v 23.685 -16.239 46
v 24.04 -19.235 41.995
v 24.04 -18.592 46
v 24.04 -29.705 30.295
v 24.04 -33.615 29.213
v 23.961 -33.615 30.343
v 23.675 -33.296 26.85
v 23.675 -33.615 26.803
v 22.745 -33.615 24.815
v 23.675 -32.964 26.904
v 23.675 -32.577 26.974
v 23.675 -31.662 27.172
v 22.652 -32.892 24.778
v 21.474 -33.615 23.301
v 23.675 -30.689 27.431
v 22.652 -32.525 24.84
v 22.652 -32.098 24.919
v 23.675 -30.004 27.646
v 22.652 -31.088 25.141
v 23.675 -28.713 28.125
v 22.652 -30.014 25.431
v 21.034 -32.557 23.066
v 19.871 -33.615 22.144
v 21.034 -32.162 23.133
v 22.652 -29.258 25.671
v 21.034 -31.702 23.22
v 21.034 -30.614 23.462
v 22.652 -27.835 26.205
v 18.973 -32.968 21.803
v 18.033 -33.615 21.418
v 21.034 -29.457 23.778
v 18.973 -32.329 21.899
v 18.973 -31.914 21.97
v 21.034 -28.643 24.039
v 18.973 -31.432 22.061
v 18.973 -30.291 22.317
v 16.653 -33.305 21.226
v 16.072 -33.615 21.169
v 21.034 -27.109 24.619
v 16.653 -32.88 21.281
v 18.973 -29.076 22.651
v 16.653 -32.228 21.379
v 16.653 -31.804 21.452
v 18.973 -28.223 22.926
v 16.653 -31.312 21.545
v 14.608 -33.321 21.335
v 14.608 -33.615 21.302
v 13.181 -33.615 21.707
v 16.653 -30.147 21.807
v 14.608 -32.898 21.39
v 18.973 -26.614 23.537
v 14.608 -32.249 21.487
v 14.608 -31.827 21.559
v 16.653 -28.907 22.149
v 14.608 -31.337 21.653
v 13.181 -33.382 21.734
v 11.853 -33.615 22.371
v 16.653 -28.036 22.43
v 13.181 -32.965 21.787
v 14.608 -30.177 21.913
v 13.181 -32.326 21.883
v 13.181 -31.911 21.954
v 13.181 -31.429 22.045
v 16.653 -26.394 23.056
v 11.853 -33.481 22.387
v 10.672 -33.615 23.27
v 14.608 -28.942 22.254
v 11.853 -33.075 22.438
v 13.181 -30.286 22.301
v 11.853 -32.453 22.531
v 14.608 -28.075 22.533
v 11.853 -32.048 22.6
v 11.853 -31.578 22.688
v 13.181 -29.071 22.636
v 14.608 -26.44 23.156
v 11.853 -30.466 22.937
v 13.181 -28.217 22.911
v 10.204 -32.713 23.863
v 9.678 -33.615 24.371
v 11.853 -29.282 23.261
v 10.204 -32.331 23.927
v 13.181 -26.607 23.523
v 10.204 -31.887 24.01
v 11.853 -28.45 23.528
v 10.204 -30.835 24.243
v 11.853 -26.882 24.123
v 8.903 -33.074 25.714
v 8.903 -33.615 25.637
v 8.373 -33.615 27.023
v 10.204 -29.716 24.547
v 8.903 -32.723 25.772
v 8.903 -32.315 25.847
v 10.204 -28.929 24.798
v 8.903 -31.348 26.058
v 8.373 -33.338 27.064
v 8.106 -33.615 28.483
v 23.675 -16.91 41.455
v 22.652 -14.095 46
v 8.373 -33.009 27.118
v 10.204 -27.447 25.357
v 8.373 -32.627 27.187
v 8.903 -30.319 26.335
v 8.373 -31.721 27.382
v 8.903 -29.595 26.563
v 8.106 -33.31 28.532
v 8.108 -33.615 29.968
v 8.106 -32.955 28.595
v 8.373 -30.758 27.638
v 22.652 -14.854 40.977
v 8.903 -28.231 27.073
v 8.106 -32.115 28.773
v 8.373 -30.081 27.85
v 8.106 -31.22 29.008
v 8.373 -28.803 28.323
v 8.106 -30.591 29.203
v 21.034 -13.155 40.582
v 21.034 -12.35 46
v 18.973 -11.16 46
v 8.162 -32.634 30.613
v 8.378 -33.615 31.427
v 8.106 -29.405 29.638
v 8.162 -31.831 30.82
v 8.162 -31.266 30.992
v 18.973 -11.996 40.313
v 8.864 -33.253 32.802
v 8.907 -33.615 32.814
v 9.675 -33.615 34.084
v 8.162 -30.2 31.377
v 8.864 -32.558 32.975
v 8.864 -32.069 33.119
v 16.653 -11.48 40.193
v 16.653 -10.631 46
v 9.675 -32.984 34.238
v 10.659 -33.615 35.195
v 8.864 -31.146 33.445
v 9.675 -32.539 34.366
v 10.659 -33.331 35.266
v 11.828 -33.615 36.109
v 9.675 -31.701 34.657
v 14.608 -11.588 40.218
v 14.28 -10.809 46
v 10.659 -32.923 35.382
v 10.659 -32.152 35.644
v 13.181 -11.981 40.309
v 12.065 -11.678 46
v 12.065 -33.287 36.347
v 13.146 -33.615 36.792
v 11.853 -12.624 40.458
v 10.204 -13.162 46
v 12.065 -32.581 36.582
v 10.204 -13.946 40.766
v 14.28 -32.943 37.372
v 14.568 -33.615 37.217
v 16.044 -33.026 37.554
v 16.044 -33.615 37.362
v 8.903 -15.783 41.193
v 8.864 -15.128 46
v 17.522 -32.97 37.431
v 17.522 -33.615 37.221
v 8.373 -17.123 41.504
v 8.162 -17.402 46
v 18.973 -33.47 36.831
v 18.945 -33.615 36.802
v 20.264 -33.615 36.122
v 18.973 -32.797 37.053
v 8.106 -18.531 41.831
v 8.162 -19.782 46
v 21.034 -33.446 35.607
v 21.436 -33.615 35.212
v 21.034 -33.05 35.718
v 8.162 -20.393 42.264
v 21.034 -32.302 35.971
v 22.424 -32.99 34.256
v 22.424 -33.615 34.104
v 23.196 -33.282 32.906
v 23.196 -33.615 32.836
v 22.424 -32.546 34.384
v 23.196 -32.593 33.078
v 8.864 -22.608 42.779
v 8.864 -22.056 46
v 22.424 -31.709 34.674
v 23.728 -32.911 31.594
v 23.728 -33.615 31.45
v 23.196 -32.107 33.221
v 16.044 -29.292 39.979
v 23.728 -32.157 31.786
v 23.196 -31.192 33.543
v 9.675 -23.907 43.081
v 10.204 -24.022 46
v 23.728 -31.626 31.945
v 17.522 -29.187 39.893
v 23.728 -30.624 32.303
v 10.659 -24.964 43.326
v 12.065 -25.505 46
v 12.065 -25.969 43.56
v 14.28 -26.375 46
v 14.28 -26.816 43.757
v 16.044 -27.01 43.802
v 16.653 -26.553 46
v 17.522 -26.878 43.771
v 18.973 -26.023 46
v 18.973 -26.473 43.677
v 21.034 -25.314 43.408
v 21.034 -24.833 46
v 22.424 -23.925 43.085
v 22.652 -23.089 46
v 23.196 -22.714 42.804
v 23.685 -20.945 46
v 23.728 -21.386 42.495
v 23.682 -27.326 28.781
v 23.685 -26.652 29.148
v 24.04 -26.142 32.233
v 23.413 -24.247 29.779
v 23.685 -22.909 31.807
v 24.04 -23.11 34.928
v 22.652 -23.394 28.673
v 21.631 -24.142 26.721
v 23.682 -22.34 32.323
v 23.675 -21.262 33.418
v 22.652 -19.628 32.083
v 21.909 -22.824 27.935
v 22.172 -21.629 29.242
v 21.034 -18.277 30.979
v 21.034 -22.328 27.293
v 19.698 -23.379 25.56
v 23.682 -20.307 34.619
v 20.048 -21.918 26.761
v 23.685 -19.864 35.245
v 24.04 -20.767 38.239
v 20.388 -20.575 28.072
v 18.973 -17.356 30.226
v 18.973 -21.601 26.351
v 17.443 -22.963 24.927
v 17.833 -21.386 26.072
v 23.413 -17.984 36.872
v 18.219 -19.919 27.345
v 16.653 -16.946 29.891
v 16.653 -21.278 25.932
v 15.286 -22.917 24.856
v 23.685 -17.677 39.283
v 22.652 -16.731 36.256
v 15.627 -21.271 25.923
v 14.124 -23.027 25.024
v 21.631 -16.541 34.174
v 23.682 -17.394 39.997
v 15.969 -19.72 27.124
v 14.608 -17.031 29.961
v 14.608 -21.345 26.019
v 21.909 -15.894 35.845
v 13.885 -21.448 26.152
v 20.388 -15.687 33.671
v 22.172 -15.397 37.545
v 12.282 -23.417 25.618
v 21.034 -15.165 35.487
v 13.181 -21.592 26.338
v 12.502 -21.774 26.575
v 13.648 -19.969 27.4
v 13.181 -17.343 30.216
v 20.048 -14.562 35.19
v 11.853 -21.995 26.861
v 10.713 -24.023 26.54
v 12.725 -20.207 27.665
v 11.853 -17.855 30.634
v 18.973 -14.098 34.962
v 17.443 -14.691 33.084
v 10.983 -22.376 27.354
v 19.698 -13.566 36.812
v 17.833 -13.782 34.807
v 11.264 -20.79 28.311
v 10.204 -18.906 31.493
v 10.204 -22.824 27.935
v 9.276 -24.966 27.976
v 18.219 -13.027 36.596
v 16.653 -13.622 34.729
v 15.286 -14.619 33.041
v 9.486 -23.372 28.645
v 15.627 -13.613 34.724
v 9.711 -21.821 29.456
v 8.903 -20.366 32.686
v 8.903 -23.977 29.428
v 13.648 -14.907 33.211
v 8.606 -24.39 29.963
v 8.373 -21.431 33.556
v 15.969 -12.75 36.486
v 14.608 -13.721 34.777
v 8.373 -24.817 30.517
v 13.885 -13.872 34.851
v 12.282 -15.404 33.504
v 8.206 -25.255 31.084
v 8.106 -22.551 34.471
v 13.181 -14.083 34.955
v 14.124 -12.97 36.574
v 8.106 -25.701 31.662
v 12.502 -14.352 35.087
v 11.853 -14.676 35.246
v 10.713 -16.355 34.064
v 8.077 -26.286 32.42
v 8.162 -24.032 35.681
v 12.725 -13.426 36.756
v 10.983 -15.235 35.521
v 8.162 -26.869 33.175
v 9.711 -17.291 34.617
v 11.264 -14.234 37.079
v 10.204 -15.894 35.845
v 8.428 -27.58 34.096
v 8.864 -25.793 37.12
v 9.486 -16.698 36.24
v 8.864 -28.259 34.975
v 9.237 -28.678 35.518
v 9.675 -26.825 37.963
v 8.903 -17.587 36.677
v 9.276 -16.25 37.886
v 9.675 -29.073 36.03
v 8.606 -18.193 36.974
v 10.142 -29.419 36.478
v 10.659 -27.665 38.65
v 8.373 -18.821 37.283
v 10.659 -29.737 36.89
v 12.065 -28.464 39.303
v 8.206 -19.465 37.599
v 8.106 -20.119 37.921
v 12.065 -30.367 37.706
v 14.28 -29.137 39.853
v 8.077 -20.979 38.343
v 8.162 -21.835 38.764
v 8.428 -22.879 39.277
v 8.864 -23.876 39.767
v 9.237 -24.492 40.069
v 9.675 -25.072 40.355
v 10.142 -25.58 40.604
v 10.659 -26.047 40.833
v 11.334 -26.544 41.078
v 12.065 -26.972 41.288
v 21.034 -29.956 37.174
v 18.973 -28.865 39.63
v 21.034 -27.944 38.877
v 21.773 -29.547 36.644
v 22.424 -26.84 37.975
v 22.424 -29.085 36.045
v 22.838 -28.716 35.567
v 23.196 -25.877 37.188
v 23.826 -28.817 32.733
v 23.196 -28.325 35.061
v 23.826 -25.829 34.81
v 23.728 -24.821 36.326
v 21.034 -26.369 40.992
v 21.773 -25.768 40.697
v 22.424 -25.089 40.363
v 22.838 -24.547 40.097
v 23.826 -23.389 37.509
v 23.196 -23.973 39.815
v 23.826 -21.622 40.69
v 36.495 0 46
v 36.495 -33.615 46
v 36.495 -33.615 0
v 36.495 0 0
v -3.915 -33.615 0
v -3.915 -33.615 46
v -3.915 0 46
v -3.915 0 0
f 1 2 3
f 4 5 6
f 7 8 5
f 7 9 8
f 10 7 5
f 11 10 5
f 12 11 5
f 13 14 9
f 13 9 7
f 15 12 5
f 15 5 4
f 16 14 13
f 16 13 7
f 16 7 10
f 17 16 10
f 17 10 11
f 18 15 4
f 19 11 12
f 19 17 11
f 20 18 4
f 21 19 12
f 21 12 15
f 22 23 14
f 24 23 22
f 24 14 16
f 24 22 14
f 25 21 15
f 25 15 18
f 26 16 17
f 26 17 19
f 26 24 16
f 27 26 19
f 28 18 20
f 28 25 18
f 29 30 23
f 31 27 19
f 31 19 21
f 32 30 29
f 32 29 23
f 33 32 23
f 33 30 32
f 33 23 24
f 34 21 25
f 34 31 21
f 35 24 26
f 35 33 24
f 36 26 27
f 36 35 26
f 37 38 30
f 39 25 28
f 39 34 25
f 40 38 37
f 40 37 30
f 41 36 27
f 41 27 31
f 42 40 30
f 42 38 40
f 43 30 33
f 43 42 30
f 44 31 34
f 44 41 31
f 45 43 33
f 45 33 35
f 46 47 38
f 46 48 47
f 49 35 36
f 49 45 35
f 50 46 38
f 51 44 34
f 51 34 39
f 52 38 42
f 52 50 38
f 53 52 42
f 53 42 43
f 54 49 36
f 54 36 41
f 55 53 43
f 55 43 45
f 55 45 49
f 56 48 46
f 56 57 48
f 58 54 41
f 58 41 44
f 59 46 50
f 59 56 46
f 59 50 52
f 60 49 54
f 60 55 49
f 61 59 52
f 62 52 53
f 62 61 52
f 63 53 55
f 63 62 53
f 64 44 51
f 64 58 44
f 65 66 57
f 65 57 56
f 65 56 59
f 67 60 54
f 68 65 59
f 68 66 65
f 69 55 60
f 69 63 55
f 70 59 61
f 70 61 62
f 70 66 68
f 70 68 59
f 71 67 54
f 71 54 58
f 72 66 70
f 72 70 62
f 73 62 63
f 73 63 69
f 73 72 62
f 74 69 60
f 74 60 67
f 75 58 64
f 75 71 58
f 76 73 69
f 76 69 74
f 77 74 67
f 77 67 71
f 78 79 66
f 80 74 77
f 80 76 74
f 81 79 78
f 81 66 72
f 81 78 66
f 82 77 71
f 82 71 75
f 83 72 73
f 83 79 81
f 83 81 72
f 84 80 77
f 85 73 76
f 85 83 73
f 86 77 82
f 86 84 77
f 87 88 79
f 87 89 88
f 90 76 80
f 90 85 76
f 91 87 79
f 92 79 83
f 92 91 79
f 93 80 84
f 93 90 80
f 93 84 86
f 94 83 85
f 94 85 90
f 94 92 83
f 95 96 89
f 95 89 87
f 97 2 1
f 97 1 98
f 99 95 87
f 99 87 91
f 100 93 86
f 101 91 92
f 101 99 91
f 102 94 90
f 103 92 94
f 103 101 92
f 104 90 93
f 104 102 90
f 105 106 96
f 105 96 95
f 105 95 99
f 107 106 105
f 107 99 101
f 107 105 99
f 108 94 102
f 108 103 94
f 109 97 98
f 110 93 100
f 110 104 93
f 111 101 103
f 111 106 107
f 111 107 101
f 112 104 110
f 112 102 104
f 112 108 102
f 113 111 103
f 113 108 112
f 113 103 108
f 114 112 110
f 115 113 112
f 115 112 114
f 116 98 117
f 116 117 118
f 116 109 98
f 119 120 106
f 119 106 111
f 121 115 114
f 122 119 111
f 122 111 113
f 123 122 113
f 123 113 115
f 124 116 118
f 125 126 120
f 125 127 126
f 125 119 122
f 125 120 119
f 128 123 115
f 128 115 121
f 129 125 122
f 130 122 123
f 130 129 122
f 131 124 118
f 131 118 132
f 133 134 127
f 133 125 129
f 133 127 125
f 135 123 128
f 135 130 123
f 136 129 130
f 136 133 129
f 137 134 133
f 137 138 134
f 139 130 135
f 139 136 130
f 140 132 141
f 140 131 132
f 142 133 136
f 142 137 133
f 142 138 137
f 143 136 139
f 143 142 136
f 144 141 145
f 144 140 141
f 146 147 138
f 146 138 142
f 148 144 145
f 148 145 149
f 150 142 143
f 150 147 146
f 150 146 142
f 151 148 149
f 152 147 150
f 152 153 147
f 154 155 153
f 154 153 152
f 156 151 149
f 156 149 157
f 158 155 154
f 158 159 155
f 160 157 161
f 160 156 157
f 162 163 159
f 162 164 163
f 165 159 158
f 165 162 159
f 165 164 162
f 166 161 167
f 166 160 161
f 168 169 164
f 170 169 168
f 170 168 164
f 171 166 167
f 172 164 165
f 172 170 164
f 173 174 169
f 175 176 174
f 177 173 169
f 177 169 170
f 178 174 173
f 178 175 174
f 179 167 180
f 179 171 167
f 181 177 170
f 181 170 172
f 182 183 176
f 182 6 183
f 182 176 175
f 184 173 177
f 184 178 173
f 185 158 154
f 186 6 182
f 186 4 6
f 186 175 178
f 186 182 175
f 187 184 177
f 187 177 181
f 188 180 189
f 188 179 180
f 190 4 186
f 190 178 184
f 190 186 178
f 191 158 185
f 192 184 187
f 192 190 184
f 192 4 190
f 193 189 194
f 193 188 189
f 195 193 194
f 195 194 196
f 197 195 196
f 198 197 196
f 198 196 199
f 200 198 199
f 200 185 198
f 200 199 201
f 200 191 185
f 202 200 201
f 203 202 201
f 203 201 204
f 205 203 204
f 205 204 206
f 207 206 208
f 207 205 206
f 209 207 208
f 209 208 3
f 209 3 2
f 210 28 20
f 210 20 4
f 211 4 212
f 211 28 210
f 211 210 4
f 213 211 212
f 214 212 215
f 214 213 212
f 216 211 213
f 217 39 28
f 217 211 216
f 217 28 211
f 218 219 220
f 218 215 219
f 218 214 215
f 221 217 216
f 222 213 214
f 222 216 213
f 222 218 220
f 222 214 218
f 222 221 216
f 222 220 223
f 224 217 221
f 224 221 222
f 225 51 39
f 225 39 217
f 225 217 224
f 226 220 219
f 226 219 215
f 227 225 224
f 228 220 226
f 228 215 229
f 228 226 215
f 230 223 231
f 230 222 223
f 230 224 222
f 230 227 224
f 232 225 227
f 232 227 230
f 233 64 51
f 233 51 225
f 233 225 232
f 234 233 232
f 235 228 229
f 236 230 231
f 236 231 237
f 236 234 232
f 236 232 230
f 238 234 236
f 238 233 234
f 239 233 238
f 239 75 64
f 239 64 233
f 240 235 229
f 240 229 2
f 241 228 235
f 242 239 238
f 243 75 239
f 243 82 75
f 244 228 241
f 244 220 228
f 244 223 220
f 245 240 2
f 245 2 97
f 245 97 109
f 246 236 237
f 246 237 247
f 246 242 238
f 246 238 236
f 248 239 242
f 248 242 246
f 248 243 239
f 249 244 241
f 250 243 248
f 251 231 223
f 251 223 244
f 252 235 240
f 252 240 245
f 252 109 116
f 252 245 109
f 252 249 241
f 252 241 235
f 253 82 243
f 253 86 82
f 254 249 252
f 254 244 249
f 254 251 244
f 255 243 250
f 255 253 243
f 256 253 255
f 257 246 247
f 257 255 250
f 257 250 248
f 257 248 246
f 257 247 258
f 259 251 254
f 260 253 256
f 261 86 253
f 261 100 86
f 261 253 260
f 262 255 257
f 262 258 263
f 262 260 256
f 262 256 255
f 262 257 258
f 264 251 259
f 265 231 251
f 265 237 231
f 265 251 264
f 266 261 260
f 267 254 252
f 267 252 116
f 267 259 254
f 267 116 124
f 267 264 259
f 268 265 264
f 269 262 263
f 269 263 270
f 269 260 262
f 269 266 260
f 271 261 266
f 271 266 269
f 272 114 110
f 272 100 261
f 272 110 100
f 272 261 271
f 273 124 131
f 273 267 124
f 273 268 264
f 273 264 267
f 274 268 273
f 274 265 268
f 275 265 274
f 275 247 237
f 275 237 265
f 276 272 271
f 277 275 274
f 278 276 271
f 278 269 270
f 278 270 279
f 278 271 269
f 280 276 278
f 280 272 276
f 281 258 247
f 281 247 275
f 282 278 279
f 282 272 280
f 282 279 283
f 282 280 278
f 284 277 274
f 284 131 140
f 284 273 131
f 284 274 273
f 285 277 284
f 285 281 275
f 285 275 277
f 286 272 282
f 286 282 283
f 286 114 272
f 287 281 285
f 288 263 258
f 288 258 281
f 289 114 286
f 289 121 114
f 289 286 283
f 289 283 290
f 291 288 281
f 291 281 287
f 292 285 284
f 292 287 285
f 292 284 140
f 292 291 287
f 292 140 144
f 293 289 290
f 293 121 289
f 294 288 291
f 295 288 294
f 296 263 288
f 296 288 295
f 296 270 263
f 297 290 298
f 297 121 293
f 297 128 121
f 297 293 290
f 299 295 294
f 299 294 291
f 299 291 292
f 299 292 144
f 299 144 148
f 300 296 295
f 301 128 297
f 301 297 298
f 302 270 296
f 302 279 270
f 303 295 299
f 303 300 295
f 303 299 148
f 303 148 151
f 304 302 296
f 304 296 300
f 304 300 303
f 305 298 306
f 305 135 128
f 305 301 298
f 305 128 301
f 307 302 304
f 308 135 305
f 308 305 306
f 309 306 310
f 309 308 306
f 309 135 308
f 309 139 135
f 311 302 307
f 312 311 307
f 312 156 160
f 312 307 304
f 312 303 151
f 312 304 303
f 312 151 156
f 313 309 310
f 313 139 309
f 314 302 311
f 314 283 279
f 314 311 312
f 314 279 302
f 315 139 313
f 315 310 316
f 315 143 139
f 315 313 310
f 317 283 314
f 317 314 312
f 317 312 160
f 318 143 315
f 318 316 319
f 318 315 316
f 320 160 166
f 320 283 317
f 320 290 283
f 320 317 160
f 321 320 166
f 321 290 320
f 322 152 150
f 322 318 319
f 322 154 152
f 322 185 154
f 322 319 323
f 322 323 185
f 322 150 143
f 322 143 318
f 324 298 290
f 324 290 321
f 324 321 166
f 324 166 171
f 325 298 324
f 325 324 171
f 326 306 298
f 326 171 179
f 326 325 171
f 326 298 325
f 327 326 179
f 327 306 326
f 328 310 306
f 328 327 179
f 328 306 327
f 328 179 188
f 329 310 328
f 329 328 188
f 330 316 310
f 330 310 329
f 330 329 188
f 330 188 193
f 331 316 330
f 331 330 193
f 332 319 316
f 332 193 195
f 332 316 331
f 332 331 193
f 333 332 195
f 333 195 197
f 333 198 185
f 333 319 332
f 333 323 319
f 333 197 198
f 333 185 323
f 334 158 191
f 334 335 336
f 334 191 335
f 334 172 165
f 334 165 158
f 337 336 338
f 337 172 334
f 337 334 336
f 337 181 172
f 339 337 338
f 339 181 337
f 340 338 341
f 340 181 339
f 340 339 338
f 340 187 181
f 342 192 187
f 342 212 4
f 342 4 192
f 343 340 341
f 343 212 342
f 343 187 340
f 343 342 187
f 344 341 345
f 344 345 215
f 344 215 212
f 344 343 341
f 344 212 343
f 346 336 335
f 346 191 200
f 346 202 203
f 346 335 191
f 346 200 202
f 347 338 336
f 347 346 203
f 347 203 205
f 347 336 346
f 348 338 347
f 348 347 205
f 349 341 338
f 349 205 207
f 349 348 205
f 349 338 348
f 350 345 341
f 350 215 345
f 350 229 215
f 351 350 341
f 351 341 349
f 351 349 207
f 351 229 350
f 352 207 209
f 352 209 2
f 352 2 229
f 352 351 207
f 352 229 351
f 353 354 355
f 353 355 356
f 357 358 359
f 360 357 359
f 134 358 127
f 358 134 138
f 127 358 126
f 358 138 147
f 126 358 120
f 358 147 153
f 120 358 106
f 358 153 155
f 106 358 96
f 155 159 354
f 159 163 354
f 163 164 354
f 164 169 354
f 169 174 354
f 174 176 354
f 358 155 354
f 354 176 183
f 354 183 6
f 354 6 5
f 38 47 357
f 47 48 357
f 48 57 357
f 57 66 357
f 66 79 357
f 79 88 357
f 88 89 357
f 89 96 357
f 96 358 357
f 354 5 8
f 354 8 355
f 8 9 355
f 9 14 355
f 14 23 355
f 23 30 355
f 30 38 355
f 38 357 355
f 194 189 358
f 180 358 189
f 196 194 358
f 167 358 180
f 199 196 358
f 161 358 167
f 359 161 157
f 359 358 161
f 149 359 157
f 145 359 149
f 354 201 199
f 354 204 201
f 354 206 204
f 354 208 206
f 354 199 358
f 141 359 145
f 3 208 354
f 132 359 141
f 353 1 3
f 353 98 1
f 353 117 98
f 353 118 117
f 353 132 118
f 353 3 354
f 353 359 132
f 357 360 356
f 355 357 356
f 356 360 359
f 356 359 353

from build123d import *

# Parameters (mm, degrees)
F0_W     = 40.4098057188
F0_H     = 33.6149521172
F1_DEPTH = 46
F2_R     = 7.9831672634


with BuildPart() as f1:
    # F0 (on Top) → F1 (new body)
    with BuildSketch(Plane.XY):
        with Locations((16.2897284608, -16.8074760586)):
            Rectangle(F0_W, F0_H)
    extrude(amount=F1_DEPTH)

    # F5: sweep along a path in F4
    with BuildLine(Plane.YZ.offset(16.056491062)) as f5_path:
        ThreePointArc((-54.1601069272, 47.6001240313), (-37.1759906858, 29.0158837587), (-18.5917504132, 46))
    # F2 (on face) → F5 (sweep, cut)
    with BuildSketch(Plane.XY.offset(46)):
        with Locations((16.056491062, -18.5917504132)):
            Circle(F2_R)
    sweep(path=f5_path.line, mode=Mode.SUBTRACT)


solid = f1.part
